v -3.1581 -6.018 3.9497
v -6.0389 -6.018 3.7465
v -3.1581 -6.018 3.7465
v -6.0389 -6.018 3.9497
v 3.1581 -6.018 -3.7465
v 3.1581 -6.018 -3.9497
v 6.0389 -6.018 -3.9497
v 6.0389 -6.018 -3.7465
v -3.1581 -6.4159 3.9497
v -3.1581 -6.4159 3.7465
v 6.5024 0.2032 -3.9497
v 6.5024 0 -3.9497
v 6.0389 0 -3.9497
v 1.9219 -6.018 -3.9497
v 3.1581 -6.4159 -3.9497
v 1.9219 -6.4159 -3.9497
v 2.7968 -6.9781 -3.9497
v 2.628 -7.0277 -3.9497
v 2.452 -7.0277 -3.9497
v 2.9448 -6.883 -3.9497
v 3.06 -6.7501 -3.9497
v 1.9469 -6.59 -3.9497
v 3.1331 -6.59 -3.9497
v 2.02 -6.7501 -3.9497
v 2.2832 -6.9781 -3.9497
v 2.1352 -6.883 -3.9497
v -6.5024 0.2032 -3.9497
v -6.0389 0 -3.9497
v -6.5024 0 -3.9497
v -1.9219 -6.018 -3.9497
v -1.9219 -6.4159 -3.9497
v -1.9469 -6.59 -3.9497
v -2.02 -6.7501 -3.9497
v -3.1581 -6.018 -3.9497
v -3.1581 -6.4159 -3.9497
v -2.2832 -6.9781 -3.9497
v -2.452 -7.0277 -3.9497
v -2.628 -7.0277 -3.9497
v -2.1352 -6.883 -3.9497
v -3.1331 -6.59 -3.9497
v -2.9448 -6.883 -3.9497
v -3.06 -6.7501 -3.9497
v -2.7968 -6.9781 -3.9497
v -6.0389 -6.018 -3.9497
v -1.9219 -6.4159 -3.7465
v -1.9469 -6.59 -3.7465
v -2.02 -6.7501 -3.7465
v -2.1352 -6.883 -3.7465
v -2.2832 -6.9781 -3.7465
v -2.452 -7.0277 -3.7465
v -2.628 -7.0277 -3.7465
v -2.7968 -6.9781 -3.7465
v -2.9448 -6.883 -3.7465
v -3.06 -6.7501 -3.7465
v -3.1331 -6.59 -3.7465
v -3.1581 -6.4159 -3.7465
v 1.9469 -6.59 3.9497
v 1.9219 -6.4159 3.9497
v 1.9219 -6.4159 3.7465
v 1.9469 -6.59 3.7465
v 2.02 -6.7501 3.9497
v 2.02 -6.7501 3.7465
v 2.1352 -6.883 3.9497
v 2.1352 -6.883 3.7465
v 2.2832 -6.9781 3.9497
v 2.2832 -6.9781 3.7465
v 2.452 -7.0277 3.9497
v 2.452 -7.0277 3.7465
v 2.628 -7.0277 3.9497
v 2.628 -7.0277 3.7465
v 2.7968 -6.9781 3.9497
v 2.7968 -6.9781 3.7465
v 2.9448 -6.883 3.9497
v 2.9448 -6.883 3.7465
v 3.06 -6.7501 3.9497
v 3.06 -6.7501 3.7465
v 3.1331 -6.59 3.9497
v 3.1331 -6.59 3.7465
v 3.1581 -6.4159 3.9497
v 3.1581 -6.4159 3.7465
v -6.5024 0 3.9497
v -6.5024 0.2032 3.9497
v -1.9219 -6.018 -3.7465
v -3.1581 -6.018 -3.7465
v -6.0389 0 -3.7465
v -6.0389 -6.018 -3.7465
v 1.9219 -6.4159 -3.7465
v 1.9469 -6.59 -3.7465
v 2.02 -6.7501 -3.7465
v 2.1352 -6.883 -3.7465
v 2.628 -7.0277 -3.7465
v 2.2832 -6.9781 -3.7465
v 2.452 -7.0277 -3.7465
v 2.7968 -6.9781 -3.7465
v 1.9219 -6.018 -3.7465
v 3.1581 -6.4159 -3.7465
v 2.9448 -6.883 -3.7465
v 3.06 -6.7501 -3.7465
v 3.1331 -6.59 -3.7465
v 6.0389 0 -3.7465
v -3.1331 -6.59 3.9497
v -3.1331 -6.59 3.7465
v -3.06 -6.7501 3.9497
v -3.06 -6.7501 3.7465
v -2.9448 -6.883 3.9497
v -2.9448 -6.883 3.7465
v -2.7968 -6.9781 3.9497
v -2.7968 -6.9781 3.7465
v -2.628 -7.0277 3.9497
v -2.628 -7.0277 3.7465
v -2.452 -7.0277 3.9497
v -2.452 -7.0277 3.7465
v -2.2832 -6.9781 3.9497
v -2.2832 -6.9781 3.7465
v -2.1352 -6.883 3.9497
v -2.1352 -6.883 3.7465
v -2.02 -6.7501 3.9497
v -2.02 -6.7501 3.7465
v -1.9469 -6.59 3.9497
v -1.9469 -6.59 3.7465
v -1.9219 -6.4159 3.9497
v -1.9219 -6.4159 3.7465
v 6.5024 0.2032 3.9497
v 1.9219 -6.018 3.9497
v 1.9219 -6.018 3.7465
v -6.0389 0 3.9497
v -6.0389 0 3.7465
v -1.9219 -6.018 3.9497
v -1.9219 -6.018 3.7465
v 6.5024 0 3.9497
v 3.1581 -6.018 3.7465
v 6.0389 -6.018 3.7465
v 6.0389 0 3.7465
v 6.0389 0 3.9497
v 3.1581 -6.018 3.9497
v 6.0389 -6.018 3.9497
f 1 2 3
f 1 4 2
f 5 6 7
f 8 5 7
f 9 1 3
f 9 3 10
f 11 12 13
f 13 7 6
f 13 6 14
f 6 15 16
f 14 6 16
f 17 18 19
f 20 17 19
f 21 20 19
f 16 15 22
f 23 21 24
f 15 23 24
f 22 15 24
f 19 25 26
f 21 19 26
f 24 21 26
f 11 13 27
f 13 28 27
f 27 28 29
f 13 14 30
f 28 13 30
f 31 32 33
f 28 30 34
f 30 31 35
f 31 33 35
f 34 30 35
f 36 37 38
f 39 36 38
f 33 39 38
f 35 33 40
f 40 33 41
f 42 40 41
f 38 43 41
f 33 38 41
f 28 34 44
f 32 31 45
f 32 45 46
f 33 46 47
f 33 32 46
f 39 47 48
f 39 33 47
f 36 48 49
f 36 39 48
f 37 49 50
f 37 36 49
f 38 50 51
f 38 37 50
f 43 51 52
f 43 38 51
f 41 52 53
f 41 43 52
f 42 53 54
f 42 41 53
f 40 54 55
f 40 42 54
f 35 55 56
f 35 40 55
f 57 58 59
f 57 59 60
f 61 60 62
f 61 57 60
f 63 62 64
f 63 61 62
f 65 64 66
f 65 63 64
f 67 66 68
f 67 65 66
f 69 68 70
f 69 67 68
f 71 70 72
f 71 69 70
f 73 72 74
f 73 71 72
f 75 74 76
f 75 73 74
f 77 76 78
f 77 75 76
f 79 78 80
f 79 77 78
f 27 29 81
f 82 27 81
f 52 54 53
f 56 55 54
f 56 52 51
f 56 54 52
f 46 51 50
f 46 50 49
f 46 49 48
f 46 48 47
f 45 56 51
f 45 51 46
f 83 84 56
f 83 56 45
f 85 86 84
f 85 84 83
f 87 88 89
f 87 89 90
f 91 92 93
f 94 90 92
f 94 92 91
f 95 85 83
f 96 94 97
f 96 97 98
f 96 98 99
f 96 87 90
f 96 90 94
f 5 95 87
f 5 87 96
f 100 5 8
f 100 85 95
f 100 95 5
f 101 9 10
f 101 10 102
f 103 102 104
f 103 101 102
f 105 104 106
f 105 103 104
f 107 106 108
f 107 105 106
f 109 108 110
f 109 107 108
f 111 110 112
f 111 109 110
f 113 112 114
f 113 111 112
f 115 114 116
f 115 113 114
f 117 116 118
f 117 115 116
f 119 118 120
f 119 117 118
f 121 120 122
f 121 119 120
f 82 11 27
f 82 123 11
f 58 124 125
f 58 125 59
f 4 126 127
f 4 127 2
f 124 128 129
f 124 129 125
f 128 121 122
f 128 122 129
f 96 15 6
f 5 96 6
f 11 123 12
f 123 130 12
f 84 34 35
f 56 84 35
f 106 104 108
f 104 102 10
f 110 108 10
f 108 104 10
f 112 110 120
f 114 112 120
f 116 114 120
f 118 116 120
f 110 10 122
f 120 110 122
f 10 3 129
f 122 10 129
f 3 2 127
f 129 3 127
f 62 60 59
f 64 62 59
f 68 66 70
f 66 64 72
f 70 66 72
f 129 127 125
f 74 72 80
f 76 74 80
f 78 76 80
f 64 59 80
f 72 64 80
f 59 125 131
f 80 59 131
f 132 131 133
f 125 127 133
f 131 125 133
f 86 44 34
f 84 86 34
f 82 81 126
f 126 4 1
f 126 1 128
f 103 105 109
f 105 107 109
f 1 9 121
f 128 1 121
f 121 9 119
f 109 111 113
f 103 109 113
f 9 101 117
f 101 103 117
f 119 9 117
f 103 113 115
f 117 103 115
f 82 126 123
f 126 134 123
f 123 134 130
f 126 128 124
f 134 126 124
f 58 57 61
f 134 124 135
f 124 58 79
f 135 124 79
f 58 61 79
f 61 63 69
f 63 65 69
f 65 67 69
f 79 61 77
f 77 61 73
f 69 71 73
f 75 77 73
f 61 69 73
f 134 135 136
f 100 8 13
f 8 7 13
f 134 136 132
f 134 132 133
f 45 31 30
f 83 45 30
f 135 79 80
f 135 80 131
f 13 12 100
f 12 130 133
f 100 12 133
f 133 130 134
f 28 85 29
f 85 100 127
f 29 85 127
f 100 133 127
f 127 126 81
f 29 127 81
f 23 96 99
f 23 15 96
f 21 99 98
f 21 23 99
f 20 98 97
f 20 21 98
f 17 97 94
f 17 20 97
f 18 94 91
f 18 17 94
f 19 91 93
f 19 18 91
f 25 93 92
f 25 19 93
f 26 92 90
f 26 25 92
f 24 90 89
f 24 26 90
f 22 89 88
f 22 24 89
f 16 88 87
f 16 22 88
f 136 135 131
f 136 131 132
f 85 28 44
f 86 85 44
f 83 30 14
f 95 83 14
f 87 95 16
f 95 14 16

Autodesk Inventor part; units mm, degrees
sketch "Sketch_1" plane through (0, 0, 0) normal (0, 1, 0) x (-1, 0, 0)
  line L0 (6.5024, 3.9497) -> (-6.5024, 3.9497)
  line L1 (-6.5024, 3.9497) -> (-6.5024, -3.9497)
  line L2 (-6.5024, -3.9497) -> (6.5024, -3.9497)
  line L3 (6.5024, -3.9497) -> (6.5024, 3.9497)
extrude "Extrusion1" add sketch "Sketch_1" along normal blind 0.2032
sketch "Sketch_2" plane through (0, 0, -3.9497) normal (0, 0, 1) x (1, 0, 0)
  line L0 (-6.0389, -6.018) -> (-3.1581, -6.018)
  line L1 (-3.1581, -6.018) -> (-3.1581, -6.4159)
  arc A0 (-3.1581, -6.4159) -> (-1.9219, -6.4159) centre (-2.54, -6.4159) ccw
  line L2 (-1.9219, -6.4159) -> (-1.9219, -6.018)
  line L3 (-1.9219, -6.018) -> (1.9219, -6.018)
  line L4 (1.9219, -6.018) -> (1.9219, -6.4159)
  arc A1 (1.9219, -6.4159) -> (3.1581, -6.4159) centre (2.54, -6.4159) ccw
  line L5 (3.1581, -6.4159) -> (3.1581, -6.018)
  line L6 (3.1581, -6.018) -> (6.0389, -6.018)
  line L7 (6.0389, -6.018) -> (6.0389, 0)
  line L8 (6.0389, 0) -> (-6.0389, 0)
  line L9 (-6.0389, 0) -> (-6.0389, -6.018)
extrude "Extrusion2" add sketch "Sketch_2" along normal blind 0.2032
sketch "Sketch_3" plane through (0, 0, 3.9497) normal (0, 0, 1) x (1, 0, 0)
  line L0 (-6.0389, -6.018) -> (-3.1581, -6.018)
  line L1 (-3.1581, -6.018) -> (-3.1581, -6.4159)
  arc A0 (-3.1581, -6.4159) -> (-1.9219, -6.4159) centre (-2.54, -6.4159) ccw
  line L2 (-1.9219, -6.4159) -> (-1.9219, -6.018)
  line L3 (-1.9219, -6.018) -> (1.9219, -6.018)
  line L4 (1.9219, -6.018) -> (1.9219, -6.4159)
  arc A1 (1.9219, -6.4159) -> (3.1581, -6.4159) centre (2.54, -6.4159) ccw
  line L5 (3.1581, -6.4159) -> (3.1581, -6.018)
  line L6 (3.1581, -6.018) -> (6.0389, -6.018)
  line L7 (6.0389, -6.018) -> (6.0389, 0)
  line L8 (6.0389, 0) -> (-6.0389, 0)
  line L9 (-6.0389, 0) -> (-6.0389, -6.018)
extrude "Extrusion3" add sketch "Sketch_3" against normal blind 0.2032
ref_plane "shroud_to_body_XY" through (0, 0, 0) normal (0, 1, 0) x (1, 0, 0)
ref_plane "shroud_to_body_YZ" through (0, 0, 0) normal (1, 0, 0) x (0, 0, -1)
ref_plane "shroud_to_body_ZX" through (0, 0, 0) normal (0, 0, -1) x (0, 1, 0)
properties part number "M20_ang_t_shorud1230TX-switch"
